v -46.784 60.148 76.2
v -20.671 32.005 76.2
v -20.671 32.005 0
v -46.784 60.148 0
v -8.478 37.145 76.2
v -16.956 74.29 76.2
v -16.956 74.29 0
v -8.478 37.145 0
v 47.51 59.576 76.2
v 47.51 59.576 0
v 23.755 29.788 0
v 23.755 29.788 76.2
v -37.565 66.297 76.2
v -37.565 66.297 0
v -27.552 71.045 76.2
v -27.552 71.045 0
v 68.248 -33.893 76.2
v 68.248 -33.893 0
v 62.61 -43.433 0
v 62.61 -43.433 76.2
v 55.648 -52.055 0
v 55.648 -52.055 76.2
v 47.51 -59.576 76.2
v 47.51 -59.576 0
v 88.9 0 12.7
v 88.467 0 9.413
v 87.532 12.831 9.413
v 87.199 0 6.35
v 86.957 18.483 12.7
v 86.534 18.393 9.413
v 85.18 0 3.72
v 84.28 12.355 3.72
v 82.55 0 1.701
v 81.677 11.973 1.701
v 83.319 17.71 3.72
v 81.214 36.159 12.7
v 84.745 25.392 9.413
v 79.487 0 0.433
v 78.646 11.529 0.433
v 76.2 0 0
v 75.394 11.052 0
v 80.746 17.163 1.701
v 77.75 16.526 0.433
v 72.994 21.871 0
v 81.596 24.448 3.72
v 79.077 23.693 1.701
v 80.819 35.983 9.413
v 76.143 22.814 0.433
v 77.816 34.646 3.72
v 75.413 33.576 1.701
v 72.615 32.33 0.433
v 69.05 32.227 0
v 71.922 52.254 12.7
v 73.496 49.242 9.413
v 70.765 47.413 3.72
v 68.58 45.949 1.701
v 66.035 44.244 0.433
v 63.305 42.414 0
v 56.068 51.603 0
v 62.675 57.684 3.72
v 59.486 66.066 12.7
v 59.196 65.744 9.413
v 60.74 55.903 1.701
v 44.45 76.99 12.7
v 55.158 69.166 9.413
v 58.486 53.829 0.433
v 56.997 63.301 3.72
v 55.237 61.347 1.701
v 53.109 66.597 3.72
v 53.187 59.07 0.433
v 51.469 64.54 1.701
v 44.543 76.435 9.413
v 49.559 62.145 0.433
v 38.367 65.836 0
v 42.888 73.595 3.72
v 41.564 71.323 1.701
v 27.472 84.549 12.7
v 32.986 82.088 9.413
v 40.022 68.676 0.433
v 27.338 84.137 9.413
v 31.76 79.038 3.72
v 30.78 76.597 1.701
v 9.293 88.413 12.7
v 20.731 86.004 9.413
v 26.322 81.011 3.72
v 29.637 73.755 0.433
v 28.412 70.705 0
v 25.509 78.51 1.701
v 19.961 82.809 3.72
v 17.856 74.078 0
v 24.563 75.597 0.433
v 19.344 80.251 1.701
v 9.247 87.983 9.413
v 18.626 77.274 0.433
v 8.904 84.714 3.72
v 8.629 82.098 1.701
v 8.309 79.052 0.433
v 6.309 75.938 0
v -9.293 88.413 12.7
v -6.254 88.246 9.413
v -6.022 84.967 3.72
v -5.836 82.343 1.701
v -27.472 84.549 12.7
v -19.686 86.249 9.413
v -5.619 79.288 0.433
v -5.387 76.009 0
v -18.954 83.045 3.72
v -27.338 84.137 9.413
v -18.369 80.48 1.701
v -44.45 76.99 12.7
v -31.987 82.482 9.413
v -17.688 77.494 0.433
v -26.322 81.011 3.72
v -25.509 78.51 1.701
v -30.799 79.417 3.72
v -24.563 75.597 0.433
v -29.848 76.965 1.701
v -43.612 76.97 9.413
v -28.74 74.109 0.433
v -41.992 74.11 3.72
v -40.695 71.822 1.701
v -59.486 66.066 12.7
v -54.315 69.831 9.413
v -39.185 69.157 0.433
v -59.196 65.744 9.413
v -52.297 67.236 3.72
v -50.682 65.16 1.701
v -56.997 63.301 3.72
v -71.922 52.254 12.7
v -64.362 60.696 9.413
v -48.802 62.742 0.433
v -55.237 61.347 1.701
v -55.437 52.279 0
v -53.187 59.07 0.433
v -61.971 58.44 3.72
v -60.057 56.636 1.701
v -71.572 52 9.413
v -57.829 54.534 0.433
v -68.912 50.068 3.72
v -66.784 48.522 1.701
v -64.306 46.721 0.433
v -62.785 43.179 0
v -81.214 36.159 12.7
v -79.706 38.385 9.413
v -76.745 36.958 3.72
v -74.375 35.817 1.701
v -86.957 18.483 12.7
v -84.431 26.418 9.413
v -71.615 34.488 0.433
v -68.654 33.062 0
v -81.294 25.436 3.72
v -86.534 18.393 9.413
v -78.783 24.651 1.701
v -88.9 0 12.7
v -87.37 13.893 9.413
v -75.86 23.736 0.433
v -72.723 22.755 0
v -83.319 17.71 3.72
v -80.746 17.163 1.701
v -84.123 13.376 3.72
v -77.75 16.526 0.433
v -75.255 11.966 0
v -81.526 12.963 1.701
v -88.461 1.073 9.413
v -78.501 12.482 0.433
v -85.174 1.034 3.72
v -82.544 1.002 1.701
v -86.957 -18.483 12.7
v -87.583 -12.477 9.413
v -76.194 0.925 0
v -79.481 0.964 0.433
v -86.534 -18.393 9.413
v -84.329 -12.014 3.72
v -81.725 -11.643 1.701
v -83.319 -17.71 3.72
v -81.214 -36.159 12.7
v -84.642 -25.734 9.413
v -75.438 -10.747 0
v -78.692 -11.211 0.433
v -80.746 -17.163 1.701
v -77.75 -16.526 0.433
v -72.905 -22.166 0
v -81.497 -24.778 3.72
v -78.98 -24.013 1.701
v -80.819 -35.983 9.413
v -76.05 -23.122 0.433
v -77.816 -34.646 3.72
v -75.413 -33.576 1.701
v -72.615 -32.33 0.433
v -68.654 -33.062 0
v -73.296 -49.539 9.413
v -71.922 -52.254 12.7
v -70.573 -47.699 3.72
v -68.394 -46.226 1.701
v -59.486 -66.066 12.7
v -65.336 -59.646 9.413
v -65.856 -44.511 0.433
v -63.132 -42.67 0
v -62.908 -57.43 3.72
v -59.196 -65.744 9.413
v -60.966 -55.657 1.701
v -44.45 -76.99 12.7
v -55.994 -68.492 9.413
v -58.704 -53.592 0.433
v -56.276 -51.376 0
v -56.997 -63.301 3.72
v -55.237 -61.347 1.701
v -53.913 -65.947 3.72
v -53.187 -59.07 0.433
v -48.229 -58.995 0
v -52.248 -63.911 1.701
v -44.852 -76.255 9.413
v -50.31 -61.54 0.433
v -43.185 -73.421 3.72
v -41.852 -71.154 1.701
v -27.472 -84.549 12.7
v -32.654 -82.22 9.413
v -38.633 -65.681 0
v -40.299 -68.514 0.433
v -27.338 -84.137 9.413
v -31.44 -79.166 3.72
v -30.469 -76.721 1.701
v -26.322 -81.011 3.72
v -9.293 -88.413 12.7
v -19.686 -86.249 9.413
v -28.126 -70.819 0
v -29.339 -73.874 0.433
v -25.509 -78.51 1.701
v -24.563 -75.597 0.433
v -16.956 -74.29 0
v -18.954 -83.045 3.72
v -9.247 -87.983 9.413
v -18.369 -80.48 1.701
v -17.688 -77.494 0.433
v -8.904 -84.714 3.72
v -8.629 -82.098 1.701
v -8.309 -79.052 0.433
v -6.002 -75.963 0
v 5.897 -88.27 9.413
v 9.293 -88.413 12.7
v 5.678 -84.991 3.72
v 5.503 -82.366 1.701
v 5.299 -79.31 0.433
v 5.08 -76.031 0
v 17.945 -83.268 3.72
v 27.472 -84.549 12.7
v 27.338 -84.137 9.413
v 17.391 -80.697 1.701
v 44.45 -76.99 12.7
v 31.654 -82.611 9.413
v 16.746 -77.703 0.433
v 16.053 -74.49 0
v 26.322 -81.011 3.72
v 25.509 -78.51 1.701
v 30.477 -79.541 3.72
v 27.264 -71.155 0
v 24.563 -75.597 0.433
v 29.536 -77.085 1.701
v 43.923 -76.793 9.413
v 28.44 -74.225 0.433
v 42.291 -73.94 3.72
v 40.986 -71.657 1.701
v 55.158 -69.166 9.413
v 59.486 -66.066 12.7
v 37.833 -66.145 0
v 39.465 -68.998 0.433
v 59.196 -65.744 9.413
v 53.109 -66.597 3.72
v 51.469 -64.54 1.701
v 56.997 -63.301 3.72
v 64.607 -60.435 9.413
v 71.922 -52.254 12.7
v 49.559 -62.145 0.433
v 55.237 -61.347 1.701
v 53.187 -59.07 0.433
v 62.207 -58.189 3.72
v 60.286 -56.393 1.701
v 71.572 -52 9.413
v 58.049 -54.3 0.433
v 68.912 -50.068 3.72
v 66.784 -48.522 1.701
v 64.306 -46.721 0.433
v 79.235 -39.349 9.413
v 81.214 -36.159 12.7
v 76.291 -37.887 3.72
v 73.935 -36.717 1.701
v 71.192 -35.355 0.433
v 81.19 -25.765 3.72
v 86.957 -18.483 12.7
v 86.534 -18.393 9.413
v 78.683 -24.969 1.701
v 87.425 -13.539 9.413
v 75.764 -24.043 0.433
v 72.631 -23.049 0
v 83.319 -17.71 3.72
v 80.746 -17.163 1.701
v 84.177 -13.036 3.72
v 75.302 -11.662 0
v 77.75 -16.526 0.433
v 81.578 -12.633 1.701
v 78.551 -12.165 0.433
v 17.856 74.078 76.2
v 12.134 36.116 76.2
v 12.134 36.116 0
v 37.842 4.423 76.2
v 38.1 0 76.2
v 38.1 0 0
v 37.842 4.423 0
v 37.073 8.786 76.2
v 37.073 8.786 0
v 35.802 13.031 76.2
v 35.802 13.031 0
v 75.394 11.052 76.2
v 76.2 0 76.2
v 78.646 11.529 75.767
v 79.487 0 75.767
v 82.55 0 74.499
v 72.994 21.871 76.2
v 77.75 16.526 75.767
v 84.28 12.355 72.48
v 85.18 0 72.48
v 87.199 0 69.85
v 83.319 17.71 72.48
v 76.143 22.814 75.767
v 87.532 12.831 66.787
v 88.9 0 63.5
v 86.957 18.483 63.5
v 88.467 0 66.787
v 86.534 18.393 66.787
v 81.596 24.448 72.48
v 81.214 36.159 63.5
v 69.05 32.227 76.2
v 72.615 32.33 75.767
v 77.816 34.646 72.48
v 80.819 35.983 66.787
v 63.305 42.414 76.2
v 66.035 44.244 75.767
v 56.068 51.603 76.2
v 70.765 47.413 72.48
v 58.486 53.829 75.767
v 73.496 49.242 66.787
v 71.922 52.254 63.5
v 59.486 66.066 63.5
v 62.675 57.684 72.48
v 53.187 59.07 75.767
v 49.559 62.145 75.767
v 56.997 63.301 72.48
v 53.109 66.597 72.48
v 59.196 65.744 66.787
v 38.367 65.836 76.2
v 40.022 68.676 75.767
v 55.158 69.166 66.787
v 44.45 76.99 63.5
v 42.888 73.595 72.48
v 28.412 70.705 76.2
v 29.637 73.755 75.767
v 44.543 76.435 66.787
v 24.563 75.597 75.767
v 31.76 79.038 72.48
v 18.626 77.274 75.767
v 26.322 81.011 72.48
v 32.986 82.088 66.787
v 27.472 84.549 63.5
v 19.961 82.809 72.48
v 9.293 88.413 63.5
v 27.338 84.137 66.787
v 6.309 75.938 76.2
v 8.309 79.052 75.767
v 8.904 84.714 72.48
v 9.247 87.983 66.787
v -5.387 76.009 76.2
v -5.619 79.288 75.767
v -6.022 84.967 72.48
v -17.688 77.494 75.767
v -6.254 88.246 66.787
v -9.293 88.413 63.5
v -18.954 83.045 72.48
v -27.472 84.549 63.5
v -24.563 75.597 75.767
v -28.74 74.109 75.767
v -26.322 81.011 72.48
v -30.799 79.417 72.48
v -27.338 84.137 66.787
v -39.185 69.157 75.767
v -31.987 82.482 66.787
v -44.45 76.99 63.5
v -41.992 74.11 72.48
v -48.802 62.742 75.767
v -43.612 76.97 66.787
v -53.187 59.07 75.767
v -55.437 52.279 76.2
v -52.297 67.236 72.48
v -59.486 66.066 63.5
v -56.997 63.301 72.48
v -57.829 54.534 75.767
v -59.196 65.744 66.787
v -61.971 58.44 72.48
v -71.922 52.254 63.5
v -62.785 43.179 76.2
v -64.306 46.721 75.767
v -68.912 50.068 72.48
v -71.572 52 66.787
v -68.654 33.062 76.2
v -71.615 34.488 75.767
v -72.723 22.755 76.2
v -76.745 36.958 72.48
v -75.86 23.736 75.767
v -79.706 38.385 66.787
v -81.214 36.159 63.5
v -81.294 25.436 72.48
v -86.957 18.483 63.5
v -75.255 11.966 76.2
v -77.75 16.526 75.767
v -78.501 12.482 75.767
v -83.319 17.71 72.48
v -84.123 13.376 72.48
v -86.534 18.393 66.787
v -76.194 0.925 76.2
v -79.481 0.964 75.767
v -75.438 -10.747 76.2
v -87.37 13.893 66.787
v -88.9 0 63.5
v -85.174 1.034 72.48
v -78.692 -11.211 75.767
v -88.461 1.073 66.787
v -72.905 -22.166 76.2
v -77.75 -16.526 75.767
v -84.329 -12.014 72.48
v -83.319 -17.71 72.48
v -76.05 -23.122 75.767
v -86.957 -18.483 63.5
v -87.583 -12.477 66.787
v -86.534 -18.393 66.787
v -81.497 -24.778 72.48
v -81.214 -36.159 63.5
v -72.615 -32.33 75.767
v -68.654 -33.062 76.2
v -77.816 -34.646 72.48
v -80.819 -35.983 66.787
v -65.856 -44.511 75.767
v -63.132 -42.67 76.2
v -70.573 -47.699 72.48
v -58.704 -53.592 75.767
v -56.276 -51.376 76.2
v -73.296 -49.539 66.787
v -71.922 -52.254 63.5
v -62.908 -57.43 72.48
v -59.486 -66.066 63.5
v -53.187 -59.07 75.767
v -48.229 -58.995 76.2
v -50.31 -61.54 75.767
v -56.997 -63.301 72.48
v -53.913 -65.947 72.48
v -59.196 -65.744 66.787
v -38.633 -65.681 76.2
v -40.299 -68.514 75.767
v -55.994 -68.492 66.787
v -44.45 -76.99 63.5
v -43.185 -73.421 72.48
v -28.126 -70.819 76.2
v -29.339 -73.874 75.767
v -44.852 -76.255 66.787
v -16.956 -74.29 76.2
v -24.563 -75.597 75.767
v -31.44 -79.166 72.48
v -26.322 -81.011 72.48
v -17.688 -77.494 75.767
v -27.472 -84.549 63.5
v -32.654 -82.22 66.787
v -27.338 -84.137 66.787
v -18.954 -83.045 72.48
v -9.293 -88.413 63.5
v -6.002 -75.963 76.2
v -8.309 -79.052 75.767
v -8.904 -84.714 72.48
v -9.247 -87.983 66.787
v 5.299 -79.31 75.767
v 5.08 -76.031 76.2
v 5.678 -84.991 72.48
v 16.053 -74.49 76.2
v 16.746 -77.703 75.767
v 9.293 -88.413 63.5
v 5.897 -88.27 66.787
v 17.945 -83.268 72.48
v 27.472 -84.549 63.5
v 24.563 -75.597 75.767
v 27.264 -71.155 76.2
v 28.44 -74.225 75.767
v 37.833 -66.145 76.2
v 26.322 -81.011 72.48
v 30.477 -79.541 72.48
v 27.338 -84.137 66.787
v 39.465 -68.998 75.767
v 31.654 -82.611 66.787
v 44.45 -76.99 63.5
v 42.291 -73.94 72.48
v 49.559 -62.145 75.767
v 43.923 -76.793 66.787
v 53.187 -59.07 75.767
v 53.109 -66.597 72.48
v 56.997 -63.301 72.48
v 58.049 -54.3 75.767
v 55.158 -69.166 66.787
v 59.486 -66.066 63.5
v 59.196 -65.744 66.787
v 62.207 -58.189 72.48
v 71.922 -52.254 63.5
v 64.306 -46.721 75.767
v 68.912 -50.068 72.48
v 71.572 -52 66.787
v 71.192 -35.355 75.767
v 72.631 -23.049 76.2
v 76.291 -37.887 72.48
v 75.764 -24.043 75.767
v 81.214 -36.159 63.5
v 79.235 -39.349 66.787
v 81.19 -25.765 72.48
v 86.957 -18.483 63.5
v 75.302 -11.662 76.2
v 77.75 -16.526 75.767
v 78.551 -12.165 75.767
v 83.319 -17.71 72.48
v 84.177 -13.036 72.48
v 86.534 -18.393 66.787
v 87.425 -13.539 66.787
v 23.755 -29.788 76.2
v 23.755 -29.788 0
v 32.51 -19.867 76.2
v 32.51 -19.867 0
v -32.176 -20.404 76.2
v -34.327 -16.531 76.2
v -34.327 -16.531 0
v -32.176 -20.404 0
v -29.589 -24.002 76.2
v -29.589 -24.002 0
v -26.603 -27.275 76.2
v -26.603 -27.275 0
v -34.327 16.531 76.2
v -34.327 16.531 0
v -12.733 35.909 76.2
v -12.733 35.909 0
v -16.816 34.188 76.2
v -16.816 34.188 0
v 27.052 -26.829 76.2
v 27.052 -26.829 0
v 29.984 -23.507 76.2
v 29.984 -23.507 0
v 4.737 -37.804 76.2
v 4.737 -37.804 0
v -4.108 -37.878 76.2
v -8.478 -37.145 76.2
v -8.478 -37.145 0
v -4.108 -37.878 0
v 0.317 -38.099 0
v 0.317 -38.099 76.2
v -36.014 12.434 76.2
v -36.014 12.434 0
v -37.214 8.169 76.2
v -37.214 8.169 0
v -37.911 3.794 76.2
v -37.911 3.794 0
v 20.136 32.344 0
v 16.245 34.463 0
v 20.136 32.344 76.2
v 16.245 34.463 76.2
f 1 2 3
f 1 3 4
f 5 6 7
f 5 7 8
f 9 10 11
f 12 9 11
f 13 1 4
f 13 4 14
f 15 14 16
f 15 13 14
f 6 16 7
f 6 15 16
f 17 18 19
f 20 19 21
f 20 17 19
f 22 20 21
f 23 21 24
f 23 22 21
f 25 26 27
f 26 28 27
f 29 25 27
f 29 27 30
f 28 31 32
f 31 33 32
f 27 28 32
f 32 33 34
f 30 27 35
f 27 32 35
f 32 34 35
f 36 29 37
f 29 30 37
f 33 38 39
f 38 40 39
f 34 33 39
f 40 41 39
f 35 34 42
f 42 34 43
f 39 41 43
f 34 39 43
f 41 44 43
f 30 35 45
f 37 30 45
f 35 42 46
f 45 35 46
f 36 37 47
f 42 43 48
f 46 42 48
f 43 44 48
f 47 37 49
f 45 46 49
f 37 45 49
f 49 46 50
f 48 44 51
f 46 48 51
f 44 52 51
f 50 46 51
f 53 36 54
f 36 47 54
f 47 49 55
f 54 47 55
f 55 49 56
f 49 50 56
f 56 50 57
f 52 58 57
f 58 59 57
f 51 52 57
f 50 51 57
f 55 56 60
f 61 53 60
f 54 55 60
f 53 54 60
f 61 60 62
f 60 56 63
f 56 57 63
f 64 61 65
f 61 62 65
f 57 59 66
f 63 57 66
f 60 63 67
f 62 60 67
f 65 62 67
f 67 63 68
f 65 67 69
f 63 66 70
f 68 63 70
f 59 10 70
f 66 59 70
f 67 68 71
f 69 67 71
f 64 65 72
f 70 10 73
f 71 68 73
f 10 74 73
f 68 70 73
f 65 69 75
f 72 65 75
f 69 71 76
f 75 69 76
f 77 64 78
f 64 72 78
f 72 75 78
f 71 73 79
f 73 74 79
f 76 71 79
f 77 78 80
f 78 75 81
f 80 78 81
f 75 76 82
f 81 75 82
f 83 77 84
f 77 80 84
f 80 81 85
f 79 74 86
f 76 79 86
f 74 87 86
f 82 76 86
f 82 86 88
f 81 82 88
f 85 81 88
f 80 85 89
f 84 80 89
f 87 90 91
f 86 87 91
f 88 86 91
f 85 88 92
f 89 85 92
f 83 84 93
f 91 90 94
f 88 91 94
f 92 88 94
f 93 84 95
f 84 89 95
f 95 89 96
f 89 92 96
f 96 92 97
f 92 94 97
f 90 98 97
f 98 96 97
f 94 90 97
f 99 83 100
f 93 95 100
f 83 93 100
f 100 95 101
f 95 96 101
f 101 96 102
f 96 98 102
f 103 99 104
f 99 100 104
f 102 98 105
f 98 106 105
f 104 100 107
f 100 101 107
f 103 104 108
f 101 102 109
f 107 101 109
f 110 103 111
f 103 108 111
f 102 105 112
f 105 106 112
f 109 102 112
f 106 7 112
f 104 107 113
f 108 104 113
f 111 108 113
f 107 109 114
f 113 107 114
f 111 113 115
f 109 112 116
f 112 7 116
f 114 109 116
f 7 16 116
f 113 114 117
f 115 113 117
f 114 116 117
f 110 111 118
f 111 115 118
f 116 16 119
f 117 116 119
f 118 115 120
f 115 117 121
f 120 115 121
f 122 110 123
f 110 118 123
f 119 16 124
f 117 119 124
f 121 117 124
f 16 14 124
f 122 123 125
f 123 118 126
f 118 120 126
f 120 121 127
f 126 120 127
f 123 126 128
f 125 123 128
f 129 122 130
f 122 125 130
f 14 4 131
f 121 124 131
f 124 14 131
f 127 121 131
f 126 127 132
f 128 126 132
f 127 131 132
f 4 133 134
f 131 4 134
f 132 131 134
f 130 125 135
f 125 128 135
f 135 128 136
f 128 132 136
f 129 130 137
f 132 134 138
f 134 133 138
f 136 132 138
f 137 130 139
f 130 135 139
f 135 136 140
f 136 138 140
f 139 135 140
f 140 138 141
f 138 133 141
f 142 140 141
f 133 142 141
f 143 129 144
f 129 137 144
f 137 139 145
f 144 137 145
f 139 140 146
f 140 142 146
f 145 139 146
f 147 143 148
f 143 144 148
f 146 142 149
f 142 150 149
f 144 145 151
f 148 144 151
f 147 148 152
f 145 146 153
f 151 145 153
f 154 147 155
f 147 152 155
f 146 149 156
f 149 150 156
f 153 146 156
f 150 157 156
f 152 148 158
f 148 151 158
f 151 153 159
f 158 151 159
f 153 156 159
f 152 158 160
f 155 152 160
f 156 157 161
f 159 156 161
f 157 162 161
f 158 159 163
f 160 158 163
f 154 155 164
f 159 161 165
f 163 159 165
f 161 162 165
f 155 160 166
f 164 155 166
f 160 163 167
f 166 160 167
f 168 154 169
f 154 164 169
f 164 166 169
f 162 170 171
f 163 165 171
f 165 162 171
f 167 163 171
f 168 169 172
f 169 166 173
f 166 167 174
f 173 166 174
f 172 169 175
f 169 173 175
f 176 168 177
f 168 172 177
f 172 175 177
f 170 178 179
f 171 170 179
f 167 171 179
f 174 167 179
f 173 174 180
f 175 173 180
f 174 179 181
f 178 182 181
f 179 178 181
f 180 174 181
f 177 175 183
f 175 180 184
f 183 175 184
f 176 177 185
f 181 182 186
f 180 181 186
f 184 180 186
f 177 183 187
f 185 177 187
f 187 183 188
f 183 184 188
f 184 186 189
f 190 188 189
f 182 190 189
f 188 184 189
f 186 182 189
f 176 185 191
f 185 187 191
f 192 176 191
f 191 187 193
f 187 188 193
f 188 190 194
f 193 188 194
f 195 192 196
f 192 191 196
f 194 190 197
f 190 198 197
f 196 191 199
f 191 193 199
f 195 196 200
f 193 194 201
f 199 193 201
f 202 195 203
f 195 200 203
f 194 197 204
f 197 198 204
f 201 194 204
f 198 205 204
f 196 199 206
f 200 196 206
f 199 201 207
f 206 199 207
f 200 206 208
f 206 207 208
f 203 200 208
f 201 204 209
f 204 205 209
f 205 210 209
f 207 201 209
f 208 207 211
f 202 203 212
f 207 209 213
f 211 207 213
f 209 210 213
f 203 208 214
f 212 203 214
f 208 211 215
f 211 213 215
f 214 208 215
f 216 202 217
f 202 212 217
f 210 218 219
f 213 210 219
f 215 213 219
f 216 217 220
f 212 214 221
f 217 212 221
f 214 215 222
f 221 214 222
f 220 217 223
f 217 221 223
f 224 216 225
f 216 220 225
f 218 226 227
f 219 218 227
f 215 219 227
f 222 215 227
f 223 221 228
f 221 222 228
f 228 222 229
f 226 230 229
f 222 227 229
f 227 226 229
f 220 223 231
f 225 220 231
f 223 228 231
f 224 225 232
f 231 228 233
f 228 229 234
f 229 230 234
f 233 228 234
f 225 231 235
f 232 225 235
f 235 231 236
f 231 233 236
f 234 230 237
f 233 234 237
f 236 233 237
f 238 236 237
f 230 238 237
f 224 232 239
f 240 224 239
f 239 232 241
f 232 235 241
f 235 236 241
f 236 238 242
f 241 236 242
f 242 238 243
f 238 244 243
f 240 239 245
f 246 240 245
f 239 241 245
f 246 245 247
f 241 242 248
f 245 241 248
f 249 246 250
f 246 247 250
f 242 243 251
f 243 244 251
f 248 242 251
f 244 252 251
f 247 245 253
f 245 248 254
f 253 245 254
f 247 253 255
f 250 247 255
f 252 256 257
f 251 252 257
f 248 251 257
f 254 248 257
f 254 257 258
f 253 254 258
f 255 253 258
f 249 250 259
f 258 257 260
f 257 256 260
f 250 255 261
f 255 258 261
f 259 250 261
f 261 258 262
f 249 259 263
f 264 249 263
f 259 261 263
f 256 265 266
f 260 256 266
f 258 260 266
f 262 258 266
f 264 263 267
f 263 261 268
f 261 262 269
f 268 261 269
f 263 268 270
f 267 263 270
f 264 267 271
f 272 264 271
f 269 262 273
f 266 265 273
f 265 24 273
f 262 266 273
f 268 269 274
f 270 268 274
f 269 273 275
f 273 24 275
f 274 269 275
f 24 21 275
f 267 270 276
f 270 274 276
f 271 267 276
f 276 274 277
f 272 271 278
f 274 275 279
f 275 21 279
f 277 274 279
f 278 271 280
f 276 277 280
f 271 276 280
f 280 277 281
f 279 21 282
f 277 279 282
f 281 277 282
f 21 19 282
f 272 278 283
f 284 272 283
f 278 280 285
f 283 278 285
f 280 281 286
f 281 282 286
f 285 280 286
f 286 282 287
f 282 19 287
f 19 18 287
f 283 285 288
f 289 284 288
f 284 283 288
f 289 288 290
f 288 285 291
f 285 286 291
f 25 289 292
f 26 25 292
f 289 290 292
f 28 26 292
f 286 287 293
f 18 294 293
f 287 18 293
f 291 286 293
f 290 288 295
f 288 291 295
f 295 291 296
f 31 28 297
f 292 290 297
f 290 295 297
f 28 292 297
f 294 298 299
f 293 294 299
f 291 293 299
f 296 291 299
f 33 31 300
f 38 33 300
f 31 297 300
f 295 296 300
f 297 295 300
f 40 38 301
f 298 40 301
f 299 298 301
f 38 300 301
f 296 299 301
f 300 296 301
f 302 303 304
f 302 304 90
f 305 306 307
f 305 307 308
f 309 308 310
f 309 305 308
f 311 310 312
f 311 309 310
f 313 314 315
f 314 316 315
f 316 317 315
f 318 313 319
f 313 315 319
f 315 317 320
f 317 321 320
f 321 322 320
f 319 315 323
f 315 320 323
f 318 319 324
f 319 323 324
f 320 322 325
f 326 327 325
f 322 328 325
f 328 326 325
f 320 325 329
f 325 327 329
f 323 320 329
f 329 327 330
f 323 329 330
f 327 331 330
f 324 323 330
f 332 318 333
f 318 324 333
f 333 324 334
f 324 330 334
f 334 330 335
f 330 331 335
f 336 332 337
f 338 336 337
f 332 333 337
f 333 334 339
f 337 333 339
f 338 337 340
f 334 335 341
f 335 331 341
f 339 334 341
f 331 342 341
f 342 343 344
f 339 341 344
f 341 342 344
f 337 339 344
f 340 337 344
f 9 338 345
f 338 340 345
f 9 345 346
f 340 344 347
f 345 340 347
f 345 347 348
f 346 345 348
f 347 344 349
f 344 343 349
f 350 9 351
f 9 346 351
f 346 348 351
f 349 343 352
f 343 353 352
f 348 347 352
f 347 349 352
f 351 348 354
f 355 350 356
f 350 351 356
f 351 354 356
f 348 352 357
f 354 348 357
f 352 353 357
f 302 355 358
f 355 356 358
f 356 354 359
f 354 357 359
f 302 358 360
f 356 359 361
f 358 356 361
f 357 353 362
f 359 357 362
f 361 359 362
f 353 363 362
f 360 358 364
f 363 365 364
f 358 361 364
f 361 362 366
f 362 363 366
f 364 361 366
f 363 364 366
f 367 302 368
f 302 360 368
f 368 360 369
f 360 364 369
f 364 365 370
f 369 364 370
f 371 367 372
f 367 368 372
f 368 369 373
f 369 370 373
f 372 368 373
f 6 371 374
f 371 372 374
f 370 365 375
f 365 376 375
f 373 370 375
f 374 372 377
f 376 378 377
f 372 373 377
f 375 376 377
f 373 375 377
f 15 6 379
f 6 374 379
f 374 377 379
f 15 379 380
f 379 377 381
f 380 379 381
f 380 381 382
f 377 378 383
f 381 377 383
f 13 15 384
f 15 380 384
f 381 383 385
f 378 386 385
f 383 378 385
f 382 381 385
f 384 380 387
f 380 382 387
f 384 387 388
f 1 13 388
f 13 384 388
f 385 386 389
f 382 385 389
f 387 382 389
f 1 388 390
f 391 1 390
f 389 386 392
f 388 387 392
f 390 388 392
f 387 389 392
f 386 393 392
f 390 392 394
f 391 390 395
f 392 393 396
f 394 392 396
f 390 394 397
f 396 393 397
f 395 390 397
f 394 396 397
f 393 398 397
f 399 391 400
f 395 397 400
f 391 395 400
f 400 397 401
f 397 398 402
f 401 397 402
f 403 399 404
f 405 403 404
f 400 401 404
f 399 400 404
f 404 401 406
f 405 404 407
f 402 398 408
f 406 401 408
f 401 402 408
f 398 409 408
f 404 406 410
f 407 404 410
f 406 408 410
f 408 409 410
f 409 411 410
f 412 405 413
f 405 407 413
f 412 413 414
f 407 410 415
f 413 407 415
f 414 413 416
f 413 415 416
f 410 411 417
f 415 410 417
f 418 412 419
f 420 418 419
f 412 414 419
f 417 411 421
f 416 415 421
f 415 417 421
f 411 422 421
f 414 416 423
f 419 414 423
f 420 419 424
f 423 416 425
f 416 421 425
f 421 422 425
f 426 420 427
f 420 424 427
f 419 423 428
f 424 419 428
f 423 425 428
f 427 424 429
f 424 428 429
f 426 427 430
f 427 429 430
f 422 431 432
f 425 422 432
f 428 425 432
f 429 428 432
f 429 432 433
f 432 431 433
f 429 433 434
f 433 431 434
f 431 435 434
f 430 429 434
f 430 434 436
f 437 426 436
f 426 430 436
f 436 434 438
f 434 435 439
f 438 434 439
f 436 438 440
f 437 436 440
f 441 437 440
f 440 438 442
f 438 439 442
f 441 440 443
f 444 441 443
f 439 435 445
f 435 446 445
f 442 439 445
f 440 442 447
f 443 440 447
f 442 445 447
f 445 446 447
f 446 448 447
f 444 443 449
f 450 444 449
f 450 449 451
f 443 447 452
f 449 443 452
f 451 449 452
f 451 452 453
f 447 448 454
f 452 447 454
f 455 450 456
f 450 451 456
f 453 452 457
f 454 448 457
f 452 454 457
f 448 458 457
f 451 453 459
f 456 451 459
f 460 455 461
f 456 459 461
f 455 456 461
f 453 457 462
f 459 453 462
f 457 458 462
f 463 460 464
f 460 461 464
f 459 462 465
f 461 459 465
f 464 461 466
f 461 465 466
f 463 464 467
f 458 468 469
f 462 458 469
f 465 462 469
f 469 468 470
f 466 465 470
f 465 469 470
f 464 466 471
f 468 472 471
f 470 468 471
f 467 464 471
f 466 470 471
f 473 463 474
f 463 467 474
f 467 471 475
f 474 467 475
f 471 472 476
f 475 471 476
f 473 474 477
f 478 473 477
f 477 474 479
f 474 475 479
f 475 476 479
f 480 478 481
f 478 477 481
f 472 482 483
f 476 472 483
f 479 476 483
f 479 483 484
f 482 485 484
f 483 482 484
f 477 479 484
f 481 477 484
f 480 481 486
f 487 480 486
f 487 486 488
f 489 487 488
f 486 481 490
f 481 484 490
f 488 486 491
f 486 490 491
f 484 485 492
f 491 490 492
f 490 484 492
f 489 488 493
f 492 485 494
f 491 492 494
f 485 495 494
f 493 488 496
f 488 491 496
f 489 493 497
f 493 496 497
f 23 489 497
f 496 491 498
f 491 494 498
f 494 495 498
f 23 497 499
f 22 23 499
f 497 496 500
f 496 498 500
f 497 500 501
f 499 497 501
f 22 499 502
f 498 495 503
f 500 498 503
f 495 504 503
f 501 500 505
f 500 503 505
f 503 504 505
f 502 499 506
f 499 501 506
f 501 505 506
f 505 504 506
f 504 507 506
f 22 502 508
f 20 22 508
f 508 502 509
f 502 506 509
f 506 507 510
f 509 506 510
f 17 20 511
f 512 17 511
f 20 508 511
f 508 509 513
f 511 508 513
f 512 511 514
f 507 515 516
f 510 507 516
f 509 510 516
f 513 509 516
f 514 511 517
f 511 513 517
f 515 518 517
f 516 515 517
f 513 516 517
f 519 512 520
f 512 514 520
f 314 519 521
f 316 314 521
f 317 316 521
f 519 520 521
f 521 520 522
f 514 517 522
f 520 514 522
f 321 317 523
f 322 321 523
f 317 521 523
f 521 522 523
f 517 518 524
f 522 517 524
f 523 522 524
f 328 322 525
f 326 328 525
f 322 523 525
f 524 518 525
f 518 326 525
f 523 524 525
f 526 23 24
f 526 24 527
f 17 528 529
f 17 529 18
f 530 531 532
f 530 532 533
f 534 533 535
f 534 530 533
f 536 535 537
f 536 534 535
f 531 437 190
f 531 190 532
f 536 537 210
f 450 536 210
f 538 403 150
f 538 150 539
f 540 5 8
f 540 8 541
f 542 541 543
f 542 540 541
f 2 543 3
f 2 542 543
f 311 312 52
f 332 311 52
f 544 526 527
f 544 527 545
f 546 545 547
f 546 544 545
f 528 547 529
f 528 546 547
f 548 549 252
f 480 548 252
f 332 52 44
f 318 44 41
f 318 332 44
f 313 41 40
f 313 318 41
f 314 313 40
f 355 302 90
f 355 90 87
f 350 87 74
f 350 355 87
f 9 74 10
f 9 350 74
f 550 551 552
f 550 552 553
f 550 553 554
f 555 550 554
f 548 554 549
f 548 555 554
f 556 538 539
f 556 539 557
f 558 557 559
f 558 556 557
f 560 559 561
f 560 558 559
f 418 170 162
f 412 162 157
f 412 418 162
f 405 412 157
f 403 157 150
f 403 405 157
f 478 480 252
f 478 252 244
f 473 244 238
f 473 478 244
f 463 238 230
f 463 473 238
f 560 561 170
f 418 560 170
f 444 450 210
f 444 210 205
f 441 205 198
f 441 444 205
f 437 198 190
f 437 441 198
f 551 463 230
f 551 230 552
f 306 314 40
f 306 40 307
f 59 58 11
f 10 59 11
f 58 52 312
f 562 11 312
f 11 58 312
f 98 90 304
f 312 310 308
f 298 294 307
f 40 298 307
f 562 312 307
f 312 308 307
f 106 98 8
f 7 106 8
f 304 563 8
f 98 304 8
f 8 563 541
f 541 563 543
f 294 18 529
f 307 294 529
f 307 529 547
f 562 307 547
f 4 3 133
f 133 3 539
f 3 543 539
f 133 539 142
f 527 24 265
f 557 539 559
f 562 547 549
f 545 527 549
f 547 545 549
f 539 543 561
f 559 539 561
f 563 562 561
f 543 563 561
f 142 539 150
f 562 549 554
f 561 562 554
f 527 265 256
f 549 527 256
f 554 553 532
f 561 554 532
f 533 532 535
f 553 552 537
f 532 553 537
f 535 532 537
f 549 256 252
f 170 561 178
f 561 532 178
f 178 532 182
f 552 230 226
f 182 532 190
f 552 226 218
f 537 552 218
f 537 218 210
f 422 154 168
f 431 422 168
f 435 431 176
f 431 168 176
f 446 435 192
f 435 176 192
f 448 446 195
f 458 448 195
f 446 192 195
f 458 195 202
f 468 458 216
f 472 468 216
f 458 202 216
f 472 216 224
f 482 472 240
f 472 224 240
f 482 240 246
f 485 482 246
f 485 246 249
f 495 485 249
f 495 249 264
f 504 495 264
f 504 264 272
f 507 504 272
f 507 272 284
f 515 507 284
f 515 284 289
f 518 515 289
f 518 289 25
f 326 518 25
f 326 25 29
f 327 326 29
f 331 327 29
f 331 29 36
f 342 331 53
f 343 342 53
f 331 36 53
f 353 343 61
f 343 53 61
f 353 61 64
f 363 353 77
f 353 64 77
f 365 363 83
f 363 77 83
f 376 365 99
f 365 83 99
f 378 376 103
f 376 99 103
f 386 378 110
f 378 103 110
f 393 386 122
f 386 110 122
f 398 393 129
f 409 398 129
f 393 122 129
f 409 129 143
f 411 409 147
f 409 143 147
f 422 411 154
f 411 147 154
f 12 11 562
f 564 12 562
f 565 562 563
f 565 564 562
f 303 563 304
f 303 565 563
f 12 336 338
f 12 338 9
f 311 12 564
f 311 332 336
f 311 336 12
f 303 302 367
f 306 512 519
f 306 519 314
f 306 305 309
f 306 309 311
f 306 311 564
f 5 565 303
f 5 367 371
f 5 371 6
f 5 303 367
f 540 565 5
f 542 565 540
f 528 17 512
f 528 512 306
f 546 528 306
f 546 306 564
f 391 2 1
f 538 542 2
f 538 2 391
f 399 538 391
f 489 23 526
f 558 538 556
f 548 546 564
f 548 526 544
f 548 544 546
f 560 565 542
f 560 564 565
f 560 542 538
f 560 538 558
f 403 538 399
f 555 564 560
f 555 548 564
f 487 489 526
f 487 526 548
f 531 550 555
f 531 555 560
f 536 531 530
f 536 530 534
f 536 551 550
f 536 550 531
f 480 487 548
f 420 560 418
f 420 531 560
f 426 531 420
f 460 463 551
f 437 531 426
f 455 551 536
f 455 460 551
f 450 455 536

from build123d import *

# Parameters (mm, degrees)
SKETCH1_R           = 88.9
BOSS_EXTRUDE1_DEPTH = 76.2
CUT_EXTRUDE1_REACH  = 149.013


with BuildPart() as part:
    # Sketch1 → Boss-Extrude1 (new body)
    with BuildSketch(Plane.XY):
        with Locations(Location((0, 0, 0), (0, 0, 180))):
            Circle(SKETCH1_R)
    extrude(amount=BOSS_EXTRUDE1_DEPTH)

    # Sketch3 → Cut-Extrude1 (cut, up to next)
    with BuildSketch(Plane.XY.offset(76.2), mode=Mode.PRIVATE) as cut_extrude1_sk1:
        with BuildLine():
            Line((35.802288852, 13.030967461), (69.049928483, 32.226501152))
            ThreePointArc((69.049928483, 32.226501152), (74.391009371, 16.505081787), (76.2, 0))
            Line((76.2, 0), (38.1, 0))
            ThreePointArc((38.1, 0), (37.52117539, 6.615995569), (35.802288852, 13.030967461))
        make_face()
    cut_extrude1_tool1 = extrude(cut_extrude1_sk1.sketch, amount=-CUT_EXTRUDE1_REACH, mode=Mode.PRIVATE) & part.part
    # Sketch3 → Cut-Extrude1 (cut, up to next)
    with BuildSketch(Plane.XY.offset(76.2), mode=Mode.PRIVATE) as cut_extrude1_sk2:
        with BuildLine():
            Line((32.51038259, -19.866681249), (68.247619398, -33.892513133))
            ThreePointArc((68.247619398, -33.892513133), (59.286228254, -47.870482966), (47.509922902, -59.575558964))
            Line((47.509922902, -59.575558964), (23.754961451, -29.787779482))
            ThreePointArc((23.754961451, -29.787779482), (28.566663833, -25.210230412), (32.51038259, -19.866681249))
        make_face()
    cut_extrude1_tool2 = extrude(cut_extrude1_sk2.sketch, amount=-CUT_EXTRUDE1_REACH, mode=Mode.PRIVATE) & part.part
    # Sketch3 → Cut-Extrude1 (cut, up to next)
    with BuildSketch(Plane.XY.offset(76.2), mode=Mode.PRIVATE) as cut_extrude1_sk3:
        with BuildLine():
            Line((4.737495147, -37.804313771), (16.053460909, -74.489773747))
            ThreePointArc((16.053460909, -74.489773747), (-0.462291956, -76.198597665), (-16.956095167, -74.289506908))
            Line((-16.956095167, -74.289506908), (-8.478047584, -37.144753454))
            ThreePointArc((-8.478047584, -37.144753454), (-1.899128244, -38.052638698), (4.737495147, -37.804313771))
        make_face()
    cut_extrude1_tool3 = extrude(cut_extrude1_sk3.sketch, amount=-CUT_EXTRUDE1_REACH, mode=Mode.PRIVATE) & part.part
    # Sketch3 → Cut-Extrude1 (cut, up to next)
    with BuildSketch(Plane.XY.offset(76.2), mode=Mode.PRIVATE) as cut_extrude1_sk4:
        with BuildLine():
            Line((-26.602822769, -27.274526957), (-48.229281076, -58.994715415))
            ThreePointArc((-48.229281076, -58.994715415), (-59.862696895, -47.147614155), (-68.653827734, -33.061940921))
            Line((-68.653827734, -33.061940921), (-34.326913867, -16.53097046))
            ThreePointArc((-34.326913867, -16.53097046), (-30.934838018, -22.240633912), (-26.602822769, -27.274526957))
        make_face()
    cut_extrude1_tool4 = extrude(cut_extrude1_sk4.sketch, amount=-CUT_EXTRUDE1_REACH, mode=Mode.PRIVATE) & part.part
    # Sketch3 → Cut-Extrude1 (cut, up to next)
    with BuildSketch(Plane.XY.offset(76.2), mode=Mode.PRIVATE) as cut_extrude1_sk5:
        with BuildLine():
            Line((-37.910672541, 3.793534955), (-76.194390713, 0.924566897))
            ThreePointArc((-76.194390713, 0.924566897), (-74.185270095, 17.40648445), (-68.653827734, 33.061940921))
            Line((-68.653827734, 33.061940921), (-34.326913867, 16.53097046))
            ThreePointArc((-34.326913867, 16.53097046), (-36.675983809, 10.319021836), (-37.910672541, 3.793534955))
        make_face()
    cut_extrude1_tool5 = extrude(cut_extrude1_sk5.sketch, amount=-CUT_EXTRUDE1_REACH, mode=Mode.PRIVATE) & part.part
    # Sketch3 → Cut-Extrude1 (cut, up to next)
    with BuildSketch(Plane.XY.offset(76.2), mode=Mode.PRIVATE) as cut_extrude1_sk6:
        with BuildLine():
            Line((-20.671012653, 32.004987672), (-46.78357006, 60.147631478))
            ThreePointArc((-46.78357006, 60.147631478), (-32.64482181, 68.853145237), (-16.956095167, 74.289506908))
            Line((-16.956095167, 74.289506908), (-8.478047584, 37.144753454))
            ThreePointArc((-8.478047584, 37.144753454), (-14.799365738, 35.108243672), (-20.671012653, 32.004987672))
        make_face()
    cut_extrude1_tool6 = extrude(cut_extrude1_sk6.sketch, amount=-CUT_EXTRUDE1_REACH, mode=Mode.PRIVATE) & part.part
    # Sketch3 → Cut-Extrude1 (cut, up to next)
    with BuildSketch(Plane.XY.offset(76.2), mode=Mode.PRIVATE) as cut_extrude1_sk7:
        with BuildLine():
            Line((12.134341375, 36.116031889), (17.856233058, 74.078302768))
            ThreePointArc((17.856233058, 74.078302768), (33.477843131, 68.451983312), (47.509922902, 59.575558964))
            Line((47.509922902, 59.575558964), (23.754961451, 29.787779482))
            ThreePointArc((23.754961451, 29.787779482), (18.221476585, 33.460241945), (12.134341375, 36.116031889))
        make_face()
    cut_extrude1_tool7 = extrude(cut_extrude1_sk7.sketch, amount=-CUT_EXTRUDE1_REACH, mode=Mode.PRIVATE) & part.part
    add(cut_extrude1_tool1.solids().sort_by_distance((58.182027, 12.183187, 76.2))[0], mode=Mode.SUBTRACT)
    add(cut_extrude1_tool2.solids().sort_by_distance((45.8011, -37.892448, 76.2))[0], mode=Mode.SUBTRACT)
    add(cut_extrude1_tool3.solids().sort_by_distance((-1.06899, -59.434296, 76.2))[0], mode=Mode.SUBTRACT)
    add(cut_extrude1_tool4.solids().sort_by_distance((-47.134109, -36.220908, 76.2))[0], mode=Mode.SUBTRACT)
    add(cut_extrude1_tool5.solids().sort_by_distance((-57.706282, 14.267563, 76.2))[0], mode=Mode.SUBTRACT)
    add(cut_extrude1_tool6.solids().sort_by_distance((-24.824448, 54.012268, 76.2))[0], mode=Mode.SUBTRACT)
    add(cut_extrude1_tool7.solids().sort_by_distance((26.750702, 53.084633, 76.2))[0], mode=Mode.SUBTRACT)

    # Fillet2: read off the stored shape, not the designer's step
    # Fillet2 outline → Fillet2 (revolve, cut)
    with BuildSketch(Plane.XZ):
        with BuildLine():
            ThreePointArc((76.2, 76.2), (85.180256121, 72.480256121), (88.9, 63.5))
            Line((88.9, 63.5), (88.9, 76.2))
            Line((88.9, 76.2), (76.2, 76.2))
        make_face()
        with BuildLine():
            Line((88.9, 0), (88.9, 12.7))
            ThreePointArc((88.9, 12.7), (85.180256121, 3.719743879), (76.2, 0))
            Line((76.2, 0), (88.9, 0))
        make_face()
    revolve(axis=Axis((0, 0, 0), (0, 0, 1)), mode=Mode.SUBTRACT)


solid = part.part
